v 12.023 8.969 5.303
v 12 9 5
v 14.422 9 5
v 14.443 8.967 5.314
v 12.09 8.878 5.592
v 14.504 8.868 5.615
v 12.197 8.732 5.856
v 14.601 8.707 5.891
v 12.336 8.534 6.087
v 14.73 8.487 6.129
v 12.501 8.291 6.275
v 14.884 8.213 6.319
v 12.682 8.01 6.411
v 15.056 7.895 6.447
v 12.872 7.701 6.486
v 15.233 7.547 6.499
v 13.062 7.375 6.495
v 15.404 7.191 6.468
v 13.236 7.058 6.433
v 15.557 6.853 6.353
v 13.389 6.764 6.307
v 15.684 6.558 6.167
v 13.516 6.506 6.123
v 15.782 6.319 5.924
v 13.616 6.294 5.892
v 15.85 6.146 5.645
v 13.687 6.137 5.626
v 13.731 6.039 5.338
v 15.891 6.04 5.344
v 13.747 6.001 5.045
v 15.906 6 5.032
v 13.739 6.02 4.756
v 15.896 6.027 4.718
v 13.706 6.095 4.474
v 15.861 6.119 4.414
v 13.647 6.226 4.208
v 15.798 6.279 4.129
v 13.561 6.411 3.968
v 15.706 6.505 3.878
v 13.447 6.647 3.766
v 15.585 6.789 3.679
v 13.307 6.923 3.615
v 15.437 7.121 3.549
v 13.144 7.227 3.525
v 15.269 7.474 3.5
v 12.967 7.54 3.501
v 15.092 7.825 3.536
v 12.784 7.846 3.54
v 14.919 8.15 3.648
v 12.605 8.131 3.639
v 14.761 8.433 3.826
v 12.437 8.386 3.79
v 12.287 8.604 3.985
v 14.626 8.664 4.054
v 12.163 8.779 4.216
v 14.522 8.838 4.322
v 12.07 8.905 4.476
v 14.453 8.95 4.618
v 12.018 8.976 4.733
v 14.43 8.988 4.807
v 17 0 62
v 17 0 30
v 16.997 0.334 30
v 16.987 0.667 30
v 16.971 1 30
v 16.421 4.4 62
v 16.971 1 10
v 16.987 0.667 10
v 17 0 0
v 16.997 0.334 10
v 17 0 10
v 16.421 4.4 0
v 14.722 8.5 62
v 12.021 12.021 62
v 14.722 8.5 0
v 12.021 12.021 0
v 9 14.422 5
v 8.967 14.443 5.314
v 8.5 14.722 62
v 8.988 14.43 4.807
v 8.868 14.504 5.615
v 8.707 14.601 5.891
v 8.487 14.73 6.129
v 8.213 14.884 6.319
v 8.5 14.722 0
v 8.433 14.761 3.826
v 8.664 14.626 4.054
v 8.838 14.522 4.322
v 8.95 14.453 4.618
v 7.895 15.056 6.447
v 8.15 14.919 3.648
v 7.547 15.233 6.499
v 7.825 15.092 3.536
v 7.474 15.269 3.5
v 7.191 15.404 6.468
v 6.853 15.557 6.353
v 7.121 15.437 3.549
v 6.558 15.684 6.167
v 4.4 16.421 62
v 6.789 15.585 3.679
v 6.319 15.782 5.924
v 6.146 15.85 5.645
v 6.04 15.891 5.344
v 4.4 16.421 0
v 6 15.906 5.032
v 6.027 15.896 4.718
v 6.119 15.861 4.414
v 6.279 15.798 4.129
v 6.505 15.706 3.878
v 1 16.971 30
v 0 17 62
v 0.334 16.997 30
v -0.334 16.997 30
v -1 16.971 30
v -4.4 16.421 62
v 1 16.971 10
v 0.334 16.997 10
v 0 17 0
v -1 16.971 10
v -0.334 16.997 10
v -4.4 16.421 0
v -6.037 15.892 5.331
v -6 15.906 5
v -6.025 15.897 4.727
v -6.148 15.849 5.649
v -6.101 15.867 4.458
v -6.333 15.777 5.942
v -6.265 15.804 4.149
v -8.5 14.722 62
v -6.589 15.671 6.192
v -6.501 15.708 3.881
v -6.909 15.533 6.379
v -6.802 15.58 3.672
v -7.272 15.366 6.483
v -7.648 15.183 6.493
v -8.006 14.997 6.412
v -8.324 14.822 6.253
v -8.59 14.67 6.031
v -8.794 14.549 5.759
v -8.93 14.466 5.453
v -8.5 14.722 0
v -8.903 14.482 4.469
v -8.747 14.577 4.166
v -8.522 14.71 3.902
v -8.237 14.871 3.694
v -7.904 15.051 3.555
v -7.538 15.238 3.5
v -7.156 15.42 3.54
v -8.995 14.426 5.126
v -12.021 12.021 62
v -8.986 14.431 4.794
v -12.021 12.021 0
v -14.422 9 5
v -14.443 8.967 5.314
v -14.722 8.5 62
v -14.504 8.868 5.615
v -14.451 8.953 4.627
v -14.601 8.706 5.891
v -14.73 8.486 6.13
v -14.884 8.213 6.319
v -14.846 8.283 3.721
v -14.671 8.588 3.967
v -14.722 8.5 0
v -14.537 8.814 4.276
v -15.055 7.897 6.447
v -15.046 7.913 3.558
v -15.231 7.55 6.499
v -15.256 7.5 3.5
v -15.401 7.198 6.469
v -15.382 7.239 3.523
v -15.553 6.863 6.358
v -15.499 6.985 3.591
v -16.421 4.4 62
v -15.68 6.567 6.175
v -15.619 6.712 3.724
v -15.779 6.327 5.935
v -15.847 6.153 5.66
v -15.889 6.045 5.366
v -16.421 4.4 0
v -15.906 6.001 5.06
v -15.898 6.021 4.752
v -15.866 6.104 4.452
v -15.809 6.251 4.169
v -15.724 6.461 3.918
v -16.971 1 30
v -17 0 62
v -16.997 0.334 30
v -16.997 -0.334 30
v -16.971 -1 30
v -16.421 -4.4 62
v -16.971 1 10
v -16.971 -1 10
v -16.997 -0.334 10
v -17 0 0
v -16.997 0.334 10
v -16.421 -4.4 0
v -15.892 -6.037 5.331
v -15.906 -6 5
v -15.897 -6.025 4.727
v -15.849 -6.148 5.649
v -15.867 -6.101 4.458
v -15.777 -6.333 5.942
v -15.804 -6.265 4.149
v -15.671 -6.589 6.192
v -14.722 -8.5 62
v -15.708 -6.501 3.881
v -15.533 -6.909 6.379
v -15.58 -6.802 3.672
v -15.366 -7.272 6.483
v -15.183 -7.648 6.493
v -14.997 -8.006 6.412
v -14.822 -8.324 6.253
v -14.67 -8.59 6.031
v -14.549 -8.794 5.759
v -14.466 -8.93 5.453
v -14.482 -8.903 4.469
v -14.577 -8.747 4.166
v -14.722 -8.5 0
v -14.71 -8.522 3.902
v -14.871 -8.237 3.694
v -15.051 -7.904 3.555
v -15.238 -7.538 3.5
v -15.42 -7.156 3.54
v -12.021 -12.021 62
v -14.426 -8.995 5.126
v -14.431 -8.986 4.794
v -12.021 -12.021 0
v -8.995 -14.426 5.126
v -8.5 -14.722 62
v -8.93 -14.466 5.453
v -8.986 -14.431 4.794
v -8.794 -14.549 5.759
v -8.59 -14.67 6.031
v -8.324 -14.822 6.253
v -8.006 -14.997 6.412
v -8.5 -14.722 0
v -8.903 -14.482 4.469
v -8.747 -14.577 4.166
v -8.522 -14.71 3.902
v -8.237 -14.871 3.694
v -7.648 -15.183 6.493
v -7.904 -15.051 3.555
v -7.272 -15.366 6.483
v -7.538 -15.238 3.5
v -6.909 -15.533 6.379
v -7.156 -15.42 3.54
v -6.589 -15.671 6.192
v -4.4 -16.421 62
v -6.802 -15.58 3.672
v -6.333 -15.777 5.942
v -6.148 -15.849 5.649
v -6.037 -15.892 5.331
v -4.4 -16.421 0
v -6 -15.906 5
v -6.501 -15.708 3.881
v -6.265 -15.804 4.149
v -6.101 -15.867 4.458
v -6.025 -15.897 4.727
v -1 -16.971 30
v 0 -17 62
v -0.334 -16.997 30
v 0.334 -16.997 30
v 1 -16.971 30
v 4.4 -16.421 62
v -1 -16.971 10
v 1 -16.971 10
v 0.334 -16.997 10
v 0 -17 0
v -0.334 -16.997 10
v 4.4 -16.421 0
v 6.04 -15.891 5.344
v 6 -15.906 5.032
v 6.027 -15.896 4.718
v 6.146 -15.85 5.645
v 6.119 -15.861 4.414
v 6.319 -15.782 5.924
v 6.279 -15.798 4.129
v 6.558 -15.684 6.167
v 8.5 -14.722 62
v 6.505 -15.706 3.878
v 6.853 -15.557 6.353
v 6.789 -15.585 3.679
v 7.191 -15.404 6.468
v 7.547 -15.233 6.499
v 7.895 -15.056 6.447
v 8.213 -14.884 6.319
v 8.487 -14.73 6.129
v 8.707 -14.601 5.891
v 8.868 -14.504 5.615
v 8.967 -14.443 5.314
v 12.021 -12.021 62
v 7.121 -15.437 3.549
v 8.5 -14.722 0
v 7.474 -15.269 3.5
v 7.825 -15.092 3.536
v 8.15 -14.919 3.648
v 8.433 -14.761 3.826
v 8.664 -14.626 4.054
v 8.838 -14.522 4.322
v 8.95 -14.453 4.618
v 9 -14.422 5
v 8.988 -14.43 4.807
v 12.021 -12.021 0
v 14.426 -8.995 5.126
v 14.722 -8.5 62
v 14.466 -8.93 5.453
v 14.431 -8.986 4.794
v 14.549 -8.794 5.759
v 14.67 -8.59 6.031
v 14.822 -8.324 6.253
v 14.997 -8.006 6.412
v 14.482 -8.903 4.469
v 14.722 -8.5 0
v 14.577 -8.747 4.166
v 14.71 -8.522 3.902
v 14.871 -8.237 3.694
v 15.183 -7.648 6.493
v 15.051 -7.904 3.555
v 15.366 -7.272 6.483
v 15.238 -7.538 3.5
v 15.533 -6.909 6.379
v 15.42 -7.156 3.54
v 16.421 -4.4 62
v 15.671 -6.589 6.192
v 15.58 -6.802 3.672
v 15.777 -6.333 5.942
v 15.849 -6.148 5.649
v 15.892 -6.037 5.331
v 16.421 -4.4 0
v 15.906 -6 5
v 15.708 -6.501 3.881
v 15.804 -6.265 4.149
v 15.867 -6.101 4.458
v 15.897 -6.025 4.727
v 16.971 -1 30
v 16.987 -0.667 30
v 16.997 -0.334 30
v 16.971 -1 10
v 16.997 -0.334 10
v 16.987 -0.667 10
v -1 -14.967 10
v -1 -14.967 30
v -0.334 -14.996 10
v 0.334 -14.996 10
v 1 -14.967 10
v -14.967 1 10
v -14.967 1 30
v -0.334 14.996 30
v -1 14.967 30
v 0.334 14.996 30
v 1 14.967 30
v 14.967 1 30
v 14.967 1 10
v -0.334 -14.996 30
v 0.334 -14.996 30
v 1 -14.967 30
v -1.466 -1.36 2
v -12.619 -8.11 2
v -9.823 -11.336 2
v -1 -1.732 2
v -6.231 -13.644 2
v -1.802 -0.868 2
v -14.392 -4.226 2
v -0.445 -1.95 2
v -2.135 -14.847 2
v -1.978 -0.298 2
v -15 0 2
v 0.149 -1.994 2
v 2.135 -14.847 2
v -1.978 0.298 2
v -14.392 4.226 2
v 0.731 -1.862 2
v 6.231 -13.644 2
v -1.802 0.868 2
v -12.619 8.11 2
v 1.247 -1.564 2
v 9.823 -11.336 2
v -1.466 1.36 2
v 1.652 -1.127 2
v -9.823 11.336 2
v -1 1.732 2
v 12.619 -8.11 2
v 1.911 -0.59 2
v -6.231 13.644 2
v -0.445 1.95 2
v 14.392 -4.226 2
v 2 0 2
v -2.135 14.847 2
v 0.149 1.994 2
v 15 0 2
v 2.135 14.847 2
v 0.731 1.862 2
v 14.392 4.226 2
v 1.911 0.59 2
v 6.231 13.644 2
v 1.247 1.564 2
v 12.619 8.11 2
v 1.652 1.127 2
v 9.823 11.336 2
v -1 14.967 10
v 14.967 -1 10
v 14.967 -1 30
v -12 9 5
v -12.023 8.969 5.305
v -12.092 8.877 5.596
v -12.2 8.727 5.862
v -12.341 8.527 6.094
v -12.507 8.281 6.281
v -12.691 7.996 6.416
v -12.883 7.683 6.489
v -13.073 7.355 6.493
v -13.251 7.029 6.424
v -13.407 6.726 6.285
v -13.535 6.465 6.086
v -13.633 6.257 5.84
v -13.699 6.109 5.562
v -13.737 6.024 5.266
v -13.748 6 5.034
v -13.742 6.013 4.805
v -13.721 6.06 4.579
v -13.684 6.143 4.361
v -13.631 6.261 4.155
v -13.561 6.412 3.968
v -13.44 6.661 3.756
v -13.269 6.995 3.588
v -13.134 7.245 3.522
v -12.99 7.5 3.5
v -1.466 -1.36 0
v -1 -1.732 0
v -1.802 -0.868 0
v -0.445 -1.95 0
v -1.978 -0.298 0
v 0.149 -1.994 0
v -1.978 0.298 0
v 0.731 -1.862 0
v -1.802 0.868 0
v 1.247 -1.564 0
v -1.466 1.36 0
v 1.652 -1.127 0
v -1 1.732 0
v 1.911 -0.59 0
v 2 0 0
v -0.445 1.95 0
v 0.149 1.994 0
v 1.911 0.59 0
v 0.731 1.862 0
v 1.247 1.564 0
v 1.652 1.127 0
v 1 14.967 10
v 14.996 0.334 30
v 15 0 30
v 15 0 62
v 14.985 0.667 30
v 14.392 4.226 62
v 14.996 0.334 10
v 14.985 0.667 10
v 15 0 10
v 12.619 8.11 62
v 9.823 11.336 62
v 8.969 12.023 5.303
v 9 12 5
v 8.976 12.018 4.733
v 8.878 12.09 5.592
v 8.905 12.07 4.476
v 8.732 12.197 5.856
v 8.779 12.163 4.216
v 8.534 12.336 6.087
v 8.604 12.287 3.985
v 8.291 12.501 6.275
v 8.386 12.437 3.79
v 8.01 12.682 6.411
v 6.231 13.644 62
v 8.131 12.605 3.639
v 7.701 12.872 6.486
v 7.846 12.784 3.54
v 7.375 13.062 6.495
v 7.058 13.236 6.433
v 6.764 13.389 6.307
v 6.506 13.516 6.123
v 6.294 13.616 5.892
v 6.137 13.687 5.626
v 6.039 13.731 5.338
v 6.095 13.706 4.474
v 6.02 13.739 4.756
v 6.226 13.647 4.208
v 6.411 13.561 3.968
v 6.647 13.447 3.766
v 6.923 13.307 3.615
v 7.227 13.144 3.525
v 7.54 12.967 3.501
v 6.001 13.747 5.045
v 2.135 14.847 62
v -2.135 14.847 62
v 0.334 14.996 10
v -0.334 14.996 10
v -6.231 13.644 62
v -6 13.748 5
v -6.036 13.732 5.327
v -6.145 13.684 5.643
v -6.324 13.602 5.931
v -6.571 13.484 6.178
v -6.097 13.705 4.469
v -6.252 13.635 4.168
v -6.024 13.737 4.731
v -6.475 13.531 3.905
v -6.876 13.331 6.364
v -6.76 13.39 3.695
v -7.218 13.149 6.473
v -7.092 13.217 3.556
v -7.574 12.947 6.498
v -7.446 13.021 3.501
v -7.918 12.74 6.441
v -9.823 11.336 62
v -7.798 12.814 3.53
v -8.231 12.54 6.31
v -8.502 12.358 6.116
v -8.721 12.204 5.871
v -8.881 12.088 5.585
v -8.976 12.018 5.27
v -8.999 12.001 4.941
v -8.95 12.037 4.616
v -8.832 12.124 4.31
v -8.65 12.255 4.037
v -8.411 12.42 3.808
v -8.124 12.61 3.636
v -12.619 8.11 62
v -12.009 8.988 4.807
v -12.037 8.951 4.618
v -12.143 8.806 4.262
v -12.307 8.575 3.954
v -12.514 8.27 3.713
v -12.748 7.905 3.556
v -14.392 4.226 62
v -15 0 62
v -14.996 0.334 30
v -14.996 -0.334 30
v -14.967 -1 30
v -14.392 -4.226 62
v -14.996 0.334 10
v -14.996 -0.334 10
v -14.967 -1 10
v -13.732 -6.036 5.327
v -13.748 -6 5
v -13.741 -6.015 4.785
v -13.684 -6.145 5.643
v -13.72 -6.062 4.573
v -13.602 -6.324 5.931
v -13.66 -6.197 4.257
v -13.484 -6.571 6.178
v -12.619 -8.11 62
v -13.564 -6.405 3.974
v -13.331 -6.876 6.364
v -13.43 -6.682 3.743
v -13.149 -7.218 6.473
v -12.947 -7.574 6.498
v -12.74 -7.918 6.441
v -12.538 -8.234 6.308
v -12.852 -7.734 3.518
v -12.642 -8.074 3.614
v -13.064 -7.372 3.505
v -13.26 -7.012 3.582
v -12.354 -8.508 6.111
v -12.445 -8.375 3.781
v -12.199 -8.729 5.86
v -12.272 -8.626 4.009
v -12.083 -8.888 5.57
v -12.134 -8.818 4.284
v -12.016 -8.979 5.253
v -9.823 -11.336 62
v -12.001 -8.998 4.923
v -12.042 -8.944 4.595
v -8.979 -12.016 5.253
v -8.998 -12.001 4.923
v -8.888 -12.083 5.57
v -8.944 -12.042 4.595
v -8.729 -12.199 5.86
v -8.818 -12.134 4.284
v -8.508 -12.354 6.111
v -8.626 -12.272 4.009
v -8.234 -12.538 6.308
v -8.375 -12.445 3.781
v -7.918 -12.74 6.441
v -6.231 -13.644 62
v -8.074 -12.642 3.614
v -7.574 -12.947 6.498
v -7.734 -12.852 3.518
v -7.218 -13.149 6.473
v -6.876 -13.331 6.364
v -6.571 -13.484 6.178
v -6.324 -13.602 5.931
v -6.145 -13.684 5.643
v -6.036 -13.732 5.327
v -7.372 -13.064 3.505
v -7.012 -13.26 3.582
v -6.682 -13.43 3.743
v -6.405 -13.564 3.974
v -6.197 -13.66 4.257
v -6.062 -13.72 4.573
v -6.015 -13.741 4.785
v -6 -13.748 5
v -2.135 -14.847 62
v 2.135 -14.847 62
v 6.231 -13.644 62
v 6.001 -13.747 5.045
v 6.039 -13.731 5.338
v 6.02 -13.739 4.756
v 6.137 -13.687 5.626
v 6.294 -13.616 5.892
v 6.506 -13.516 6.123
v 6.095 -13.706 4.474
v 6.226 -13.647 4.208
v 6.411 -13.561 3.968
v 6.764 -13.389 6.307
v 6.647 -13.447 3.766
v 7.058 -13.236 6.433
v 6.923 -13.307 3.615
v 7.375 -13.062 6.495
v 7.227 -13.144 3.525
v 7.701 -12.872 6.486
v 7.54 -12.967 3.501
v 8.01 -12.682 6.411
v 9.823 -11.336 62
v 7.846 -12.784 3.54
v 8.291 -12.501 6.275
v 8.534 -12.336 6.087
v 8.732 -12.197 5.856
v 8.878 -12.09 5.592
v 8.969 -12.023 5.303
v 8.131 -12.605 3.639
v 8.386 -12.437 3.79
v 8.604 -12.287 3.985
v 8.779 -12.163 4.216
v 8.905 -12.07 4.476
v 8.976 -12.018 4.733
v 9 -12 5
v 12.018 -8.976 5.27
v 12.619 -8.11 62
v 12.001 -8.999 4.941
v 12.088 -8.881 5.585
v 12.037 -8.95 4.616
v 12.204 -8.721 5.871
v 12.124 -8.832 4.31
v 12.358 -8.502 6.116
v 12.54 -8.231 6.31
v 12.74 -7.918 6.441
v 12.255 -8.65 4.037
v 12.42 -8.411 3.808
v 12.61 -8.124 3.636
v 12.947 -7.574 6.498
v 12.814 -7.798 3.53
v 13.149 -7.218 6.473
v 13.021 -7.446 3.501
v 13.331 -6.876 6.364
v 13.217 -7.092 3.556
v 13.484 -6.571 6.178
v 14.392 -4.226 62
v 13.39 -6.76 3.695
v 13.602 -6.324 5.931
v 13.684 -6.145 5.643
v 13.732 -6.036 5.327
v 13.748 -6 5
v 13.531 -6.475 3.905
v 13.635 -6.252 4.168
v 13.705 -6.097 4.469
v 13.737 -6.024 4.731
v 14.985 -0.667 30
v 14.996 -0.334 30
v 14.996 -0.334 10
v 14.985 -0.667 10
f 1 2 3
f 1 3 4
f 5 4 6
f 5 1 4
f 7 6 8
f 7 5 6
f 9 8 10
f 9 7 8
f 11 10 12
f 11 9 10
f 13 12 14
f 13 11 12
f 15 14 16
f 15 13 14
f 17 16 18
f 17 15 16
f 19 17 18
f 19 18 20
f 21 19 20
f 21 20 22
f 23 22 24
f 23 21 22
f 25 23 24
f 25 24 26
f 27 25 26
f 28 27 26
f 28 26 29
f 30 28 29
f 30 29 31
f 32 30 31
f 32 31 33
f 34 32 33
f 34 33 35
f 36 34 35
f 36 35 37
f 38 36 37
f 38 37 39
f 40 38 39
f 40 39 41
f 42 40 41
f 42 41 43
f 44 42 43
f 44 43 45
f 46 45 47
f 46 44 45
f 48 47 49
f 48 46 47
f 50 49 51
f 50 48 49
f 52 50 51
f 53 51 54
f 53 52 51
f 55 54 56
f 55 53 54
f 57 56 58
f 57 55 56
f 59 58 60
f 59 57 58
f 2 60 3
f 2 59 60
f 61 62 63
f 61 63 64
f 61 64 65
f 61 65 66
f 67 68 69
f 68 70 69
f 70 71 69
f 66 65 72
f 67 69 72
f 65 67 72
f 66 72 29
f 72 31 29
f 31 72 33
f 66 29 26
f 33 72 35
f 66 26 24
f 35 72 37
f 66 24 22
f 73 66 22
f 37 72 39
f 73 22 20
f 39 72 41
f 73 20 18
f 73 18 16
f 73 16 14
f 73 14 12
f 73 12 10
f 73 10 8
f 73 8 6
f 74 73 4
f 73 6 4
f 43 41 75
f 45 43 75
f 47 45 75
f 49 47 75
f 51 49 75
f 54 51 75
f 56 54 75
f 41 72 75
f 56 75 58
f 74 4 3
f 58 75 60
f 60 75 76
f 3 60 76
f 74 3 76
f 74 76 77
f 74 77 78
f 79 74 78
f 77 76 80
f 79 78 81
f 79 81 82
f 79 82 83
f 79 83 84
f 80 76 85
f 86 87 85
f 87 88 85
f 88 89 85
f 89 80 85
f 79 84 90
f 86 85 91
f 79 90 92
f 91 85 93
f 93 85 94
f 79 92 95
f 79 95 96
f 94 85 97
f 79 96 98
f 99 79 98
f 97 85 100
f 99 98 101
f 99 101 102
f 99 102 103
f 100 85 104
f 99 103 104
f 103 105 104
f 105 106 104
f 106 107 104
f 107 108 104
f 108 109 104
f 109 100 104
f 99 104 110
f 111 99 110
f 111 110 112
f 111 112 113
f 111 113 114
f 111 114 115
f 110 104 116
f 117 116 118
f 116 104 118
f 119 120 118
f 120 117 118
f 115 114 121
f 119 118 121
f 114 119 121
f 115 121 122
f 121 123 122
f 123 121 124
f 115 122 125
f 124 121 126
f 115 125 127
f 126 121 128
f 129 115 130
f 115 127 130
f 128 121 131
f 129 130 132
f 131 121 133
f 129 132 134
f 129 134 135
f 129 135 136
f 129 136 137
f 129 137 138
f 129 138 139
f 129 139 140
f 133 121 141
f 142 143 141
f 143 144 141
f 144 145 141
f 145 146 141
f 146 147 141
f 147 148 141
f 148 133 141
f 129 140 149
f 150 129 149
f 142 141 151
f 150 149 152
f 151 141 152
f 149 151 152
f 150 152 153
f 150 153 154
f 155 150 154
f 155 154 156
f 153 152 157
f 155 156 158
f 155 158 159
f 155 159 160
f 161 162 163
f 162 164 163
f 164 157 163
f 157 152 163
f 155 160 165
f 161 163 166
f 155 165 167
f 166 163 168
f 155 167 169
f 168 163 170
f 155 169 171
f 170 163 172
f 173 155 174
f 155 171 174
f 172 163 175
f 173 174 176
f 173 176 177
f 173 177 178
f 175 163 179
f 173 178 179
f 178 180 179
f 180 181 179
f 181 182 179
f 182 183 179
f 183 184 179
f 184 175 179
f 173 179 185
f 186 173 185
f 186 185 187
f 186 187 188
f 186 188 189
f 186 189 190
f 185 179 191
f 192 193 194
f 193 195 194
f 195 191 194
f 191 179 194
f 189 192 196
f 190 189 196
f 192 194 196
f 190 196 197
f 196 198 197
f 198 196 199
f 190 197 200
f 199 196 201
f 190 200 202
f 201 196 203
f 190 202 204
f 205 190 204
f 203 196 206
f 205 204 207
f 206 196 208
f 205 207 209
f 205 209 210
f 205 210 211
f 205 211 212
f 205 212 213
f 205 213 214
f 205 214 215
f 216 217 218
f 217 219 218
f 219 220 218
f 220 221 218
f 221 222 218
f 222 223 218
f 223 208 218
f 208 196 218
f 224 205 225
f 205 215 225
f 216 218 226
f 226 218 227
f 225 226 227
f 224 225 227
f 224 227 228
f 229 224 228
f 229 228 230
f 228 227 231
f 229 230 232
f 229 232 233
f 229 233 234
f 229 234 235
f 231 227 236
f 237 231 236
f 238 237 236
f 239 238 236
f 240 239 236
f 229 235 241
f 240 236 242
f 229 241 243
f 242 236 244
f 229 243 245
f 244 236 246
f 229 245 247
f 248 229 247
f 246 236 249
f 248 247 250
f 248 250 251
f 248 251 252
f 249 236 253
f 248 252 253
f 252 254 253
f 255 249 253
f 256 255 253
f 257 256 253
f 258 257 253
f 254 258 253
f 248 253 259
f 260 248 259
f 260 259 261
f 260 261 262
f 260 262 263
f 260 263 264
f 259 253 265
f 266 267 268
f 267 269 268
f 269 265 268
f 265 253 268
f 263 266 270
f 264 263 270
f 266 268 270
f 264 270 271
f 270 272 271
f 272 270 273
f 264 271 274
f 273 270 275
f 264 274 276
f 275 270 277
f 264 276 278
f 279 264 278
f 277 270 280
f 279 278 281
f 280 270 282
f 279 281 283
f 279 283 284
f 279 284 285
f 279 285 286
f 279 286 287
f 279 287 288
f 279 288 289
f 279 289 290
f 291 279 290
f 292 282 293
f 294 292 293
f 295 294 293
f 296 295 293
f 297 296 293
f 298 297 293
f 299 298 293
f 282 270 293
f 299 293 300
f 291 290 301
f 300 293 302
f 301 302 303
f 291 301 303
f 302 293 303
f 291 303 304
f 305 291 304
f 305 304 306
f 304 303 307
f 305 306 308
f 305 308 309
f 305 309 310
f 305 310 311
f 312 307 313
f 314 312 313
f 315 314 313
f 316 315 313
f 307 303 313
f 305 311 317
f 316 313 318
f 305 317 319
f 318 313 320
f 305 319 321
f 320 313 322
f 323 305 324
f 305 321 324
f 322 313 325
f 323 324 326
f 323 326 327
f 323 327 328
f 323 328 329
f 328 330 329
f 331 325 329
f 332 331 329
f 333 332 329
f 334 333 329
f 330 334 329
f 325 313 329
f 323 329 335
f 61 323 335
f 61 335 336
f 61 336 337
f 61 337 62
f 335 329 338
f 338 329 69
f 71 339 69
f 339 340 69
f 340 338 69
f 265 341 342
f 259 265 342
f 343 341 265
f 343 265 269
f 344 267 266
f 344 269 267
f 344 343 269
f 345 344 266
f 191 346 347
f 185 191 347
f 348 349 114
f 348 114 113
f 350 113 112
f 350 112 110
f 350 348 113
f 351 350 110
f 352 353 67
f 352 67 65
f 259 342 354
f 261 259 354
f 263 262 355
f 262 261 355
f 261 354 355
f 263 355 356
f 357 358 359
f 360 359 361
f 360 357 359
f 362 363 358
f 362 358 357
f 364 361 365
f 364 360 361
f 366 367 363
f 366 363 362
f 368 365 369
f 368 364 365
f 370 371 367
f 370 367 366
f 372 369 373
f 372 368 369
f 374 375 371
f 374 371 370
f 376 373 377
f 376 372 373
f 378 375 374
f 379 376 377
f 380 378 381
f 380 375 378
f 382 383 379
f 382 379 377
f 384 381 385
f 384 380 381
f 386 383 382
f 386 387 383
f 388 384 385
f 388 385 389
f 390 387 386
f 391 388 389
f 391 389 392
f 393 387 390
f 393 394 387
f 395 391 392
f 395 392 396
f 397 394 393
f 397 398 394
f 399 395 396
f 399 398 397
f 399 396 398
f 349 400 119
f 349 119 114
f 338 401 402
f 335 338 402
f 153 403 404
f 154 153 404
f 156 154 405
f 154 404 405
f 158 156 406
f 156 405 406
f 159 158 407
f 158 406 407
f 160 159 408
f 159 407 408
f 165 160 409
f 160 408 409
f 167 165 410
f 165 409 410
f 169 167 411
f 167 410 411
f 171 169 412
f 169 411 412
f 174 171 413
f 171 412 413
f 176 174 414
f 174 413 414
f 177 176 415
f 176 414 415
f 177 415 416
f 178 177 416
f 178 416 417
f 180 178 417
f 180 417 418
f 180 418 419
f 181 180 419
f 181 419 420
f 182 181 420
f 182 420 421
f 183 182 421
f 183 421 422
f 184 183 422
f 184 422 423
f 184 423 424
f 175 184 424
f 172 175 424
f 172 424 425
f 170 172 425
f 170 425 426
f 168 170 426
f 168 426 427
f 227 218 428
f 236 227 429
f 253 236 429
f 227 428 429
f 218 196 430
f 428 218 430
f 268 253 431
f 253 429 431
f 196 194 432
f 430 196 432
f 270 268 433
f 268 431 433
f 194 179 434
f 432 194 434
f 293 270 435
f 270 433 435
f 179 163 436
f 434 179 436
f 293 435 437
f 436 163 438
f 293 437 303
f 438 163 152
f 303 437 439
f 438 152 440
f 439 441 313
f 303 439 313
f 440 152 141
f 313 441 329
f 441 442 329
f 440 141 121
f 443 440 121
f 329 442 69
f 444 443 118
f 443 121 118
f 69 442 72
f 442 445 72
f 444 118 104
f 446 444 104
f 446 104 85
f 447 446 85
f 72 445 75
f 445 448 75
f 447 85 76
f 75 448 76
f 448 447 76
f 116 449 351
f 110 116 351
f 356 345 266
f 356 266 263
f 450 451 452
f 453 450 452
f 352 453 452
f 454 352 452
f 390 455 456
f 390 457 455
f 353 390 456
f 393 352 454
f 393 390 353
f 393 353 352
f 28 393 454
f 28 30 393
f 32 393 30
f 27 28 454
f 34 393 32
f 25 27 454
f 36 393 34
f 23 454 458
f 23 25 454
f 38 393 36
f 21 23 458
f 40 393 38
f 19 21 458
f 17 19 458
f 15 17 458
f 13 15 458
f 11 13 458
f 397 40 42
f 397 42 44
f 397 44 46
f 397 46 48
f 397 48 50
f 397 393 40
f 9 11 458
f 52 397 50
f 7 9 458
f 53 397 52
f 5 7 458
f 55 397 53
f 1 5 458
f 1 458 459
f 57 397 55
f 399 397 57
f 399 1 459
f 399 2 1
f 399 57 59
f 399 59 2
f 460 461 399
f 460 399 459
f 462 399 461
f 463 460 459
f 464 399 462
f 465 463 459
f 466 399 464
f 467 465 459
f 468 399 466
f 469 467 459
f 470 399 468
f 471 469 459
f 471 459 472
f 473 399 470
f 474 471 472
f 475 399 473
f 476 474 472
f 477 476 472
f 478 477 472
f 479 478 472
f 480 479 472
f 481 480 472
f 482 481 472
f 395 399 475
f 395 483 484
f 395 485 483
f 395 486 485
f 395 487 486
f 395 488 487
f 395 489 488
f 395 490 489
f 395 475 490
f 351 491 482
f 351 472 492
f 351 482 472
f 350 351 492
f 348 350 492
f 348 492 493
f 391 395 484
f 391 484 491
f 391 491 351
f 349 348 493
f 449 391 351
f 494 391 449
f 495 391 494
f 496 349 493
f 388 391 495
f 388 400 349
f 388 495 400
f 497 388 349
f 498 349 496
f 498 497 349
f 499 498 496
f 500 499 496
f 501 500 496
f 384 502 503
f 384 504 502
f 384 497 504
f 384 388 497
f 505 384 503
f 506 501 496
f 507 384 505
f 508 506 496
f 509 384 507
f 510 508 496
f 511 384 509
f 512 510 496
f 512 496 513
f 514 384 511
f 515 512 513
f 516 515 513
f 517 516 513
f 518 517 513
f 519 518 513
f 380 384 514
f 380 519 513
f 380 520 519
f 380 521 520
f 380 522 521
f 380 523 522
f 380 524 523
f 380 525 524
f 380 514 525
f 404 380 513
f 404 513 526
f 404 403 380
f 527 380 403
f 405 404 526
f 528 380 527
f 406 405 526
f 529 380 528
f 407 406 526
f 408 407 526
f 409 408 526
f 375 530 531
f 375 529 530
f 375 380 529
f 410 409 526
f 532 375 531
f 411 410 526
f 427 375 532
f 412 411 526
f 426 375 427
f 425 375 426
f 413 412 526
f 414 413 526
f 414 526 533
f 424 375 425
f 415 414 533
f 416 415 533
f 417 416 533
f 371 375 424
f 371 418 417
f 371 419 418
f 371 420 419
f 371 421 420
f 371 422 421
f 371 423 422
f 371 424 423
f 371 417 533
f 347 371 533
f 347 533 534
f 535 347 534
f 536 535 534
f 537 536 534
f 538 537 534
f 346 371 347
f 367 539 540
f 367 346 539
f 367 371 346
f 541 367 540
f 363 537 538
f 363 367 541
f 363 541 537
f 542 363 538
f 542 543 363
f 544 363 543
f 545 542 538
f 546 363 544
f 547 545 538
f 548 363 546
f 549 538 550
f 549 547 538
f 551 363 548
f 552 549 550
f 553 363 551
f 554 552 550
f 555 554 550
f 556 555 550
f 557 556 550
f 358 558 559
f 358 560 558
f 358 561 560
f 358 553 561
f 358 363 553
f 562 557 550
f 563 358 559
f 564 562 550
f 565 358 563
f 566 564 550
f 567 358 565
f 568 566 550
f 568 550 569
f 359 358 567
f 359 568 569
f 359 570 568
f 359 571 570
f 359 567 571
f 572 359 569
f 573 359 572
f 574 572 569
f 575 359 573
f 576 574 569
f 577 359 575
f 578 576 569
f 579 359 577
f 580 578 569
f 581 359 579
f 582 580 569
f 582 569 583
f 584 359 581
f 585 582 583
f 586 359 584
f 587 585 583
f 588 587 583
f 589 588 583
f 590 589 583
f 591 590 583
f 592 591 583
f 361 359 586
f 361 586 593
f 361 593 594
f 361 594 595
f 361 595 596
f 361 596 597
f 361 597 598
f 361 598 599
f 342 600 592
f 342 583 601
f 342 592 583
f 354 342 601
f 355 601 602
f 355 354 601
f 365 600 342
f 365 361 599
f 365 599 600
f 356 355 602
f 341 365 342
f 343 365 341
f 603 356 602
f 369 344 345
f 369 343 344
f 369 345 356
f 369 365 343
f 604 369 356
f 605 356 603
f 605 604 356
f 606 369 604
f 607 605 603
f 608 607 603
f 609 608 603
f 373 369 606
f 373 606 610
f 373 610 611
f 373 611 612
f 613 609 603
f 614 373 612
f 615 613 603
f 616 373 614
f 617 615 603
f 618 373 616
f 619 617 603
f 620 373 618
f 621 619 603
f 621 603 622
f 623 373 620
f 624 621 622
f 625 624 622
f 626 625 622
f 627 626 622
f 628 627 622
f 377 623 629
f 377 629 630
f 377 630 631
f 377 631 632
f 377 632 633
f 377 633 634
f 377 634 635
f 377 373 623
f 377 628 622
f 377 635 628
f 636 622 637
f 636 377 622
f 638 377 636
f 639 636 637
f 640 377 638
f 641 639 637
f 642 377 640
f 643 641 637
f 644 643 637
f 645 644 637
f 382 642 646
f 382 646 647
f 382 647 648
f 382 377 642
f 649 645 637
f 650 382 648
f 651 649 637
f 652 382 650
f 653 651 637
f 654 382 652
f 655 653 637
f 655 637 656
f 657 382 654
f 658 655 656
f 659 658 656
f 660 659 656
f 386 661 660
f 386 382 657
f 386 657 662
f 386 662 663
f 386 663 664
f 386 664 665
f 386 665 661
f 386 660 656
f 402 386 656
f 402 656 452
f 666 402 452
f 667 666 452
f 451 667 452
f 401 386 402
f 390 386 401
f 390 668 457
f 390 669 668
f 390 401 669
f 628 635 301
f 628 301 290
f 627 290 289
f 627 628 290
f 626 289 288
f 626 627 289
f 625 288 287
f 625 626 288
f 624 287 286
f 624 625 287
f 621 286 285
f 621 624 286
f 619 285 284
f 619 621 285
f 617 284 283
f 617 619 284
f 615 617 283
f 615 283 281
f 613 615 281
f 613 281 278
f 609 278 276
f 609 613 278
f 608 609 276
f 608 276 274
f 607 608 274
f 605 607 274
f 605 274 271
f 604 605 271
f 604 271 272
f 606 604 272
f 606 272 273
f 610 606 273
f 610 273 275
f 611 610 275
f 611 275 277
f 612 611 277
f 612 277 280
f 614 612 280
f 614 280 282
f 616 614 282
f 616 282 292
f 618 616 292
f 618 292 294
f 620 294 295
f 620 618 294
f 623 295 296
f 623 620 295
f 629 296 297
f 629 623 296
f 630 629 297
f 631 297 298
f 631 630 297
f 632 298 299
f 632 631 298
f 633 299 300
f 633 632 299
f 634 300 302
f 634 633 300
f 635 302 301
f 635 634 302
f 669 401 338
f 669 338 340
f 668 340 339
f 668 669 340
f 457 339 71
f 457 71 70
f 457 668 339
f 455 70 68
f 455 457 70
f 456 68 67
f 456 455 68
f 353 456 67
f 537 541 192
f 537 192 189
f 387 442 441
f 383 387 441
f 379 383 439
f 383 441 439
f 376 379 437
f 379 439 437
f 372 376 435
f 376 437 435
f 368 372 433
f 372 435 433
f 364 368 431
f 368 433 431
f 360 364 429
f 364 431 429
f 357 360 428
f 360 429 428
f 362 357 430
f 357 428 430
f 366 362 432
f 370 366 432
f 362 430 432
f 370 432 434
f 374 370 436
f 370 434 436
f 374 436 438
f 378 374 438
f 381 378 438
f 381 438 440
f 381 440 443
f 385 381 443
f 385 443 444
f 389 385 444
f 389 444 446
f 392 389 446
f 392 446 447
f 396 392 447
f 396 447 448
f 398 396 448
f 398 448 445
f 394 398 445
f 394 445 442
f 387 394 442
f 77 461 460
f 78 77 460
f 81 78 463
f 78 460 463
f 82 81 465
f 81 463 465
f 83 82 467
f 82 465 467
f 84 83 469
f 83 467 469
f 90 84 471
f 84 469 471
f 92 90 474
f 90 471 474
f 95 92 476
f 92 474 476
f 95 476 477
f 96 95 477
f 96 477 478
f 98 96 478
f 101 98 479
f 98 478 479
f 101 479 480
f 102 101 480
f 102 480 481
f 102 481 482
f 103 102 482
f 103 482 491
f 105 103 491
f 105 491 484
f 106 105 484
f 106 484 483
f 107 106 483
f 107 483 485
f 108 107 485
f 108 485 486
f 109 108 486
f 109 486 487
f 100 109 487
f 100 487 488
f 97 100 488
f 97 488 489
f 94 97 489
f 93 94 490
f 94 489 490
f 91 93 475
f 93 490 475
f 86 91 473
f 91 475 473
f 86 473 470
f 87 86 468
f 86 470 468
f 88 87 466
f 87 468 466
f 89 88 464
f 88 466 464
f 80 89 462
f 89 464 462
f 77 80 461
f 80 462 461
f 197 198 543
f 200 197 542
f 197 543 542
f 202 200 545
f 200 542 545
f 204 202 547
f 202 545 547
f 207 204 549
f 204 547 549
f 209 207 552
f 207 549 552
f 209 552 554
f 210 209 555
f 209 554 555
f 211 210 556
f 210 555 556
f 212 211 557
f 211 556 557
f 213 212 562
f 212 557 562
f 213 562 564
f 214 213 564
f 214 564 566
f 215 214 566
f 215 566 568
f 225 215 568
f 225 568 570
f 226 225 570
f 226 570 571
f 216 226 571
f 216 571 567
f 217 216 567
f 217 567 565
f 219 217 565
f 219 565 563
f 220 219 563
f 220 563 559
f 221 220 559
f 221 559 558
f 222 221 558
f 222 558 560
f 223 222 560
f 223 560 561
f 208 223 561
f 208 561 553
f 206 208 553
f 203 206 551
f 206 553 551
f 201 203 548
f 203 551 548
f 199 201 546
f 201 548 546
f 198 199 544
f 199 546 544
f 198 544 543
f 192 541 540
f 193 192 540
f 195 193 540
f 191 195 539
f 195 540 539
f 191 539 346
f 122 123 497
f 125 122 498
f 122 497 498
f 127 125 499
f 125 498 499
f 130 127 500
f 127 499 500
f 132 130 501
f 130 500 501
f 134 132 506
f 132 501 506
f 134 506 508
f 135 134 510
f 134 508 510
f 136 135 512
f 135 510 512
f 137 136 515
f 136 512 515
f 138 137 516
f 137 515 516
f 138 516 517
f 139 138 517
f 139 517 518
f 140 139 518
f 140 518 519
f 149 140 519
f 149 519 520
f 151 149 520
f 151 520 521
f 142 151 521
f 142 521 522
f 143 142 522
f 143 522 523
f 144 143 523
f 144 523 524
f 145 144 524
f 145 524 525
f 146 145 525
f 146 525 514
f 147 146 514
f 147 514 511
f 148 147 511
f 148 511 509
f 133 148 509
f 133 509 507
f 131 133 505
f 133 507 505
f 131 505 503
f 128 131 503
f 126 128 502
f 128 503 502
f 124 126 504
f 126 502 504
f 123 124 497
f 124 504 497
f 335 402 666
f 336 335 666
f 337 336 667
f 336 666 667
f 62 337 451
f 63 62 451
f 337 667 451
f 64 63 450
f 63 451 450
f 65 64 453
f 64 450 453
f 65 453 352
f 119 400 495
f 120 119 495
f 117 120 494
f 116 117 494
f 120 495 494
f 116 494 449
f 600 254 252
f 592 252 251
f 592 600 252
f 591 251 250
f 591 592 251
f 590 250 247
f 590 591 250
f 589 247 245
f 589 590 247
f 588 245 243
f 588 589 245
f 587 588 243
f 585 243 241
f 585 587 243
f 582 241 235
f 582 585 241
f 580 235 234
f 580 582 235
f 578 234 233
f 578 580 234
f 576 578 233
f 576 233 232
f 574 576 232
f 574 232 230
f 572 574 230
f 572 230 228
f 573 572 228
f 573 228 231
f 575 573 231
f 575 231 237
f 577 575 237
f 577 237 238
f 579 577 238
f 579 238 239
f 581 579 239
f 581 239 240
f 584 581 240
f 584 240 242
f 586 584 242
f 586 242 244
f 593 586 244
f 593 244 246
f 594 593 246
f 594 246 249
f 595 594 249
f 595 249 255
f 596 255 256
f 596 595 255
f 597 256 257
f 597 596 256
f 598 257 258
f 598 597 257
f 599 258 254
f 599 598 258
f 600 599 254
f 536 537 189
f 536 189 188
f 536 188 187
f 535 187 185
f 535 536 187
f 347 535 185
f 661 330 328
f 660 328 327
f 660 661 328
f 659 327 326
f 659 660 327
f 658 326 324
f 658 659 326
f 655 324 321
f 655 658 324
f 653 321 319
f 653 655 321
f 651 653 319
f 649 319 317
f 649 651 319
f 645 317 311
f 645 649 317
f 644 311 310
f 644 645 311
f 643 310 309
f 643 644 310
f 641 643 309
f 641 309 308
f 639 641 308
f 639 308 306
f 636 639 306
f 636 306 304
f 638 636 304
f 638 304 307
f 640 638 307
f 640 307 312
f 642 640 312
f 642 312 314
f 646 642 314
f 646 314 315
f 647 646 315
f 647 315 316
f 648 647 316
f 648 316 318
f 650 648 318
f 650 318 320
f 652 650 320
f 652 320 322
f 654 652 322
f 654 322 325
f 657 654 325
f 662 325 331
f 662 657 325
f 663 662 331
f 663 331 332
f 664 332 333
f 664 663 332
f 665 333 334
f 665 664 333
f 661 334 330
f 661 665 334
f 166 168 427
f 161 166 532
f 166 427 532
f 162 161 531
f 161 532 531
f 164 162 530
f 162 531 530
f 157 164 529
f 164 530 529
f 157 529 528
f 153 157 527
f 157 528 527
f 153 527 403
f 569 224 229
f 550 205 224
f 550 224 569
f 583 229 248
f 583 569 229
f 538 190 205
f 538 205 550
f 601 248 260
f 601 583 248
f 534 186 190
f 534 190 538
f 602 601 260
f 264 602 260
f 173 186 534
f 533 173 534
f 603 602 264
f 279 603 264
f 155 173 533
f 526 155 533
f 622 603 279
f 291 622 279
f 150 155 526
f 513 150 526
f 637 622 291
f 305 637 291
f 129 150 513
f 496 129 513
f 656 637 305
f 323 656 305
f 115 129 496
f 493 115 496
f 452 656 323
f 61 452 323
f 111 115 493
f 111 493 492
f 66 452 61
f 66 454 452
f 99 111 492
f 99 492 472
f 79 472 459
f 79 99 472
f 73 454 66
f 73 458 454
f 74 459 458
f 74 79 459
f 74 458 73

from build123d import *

# Parameters (mm, degrees)
F0_R      = 17
F1_DEPTH  = 62
F2_T      = -2
F3_W      = 2
F3_H      = 20
F4_DEPTH  = 25
F5_W      = 2
F5_H      = 20
F6_DEPTH  = 25
F7_W      = 2
F7_H      = 20
F8_DEPTH  = 25
F9_W      = 2
F9_H      = 20
F10_DEPTH = 25
F11_R     = 1.5
F12_DEPTH = 25
F13_R     = 1.5
F14_DEPTH = 25
F15_R     = 1.5
F16_DEPTH = 25
F17_R     = 1.5
F18_DEPTH = 25
F19_R     = 2
F20_DEPTH = 25


with BuildPart() as f1:
    # F0 (on Top) → F1 (new body)
    with BuildSketch(Plane.XY):
        Circle(F0_R)
    extrude(amount=F1_DEPTH)

    # F2
    f2_openings = [f1.faces().sort_by_distance(p)[0] for p in [
        (0, 0, 62),
    ]]
    offset(amount=F2_T, openings=f2_openings)

    # F3 (on Front) → F4 (cut)
    with BuildSketch(Plane.XZ):
        with Locations((0, 20)):
            Rectangle(F3_W, F3_H)
    extrude(amount=-F4_DEPTH, mode=Mode.SUBTRACT)

    # F5 (on Front) → F6 (cut)
    with BuildSketch(Plane.XZ):
        with Locations((0, 20)):
            Rectangle(F5_W, F5_H)
    extrude(amount=F6_DEPTH, mode=Mode.SUBTRACT)

    # F7 (on Right) → F8 (cut)
    with BuildSketch(Plane.YZ):
        with Locations((0, 20)):
            Rectangle(F7_W, F7_H)
    extrude(amount=-F8_DEPTH, mode=Mode.SUBTRACT)

    # F9 (on Right) → F10 (cut)
    with BuildSketch(Plane.YZ):
        with Locations((0, 20)):
            Rectangle(F9_W, F9_H)
    extrude(amount=F10_DEPTH, mode=Mode.SUBTRACT)

    # F11 (on Front) → F12 (cut)
    with BuildSketch(Plane.XZ):
        with Locations((7.5, 5)):
            Circle(F11_R)
        with Locations((-7.5, 5)):
            Circle(F11_R)
    extrude(amount=-F12_DEPTH, mode=Mode.SUBTRACT)

    # F13 (on Front) → F14 (cut)
    with BuildSketch(Plane.XZ):
        with Locations((7.5, 5)):
            Circle(F13_R)
        with Locations((-7.5, 5)):
            Circle(F13_R)
    extrude(amount=F14_DEPTH, mode=Mode.SUBTRACT)

    # F15 (on Right) → F16 (cut)
    with BuildSketch(Plane.YZ):
        with BuildLine():
            ThreePointArc((7.5, 3.5), (8.56066, 3.93934), (9, 5))
            ThreePointArc((9, 5), (6.43934, 6.06066), (7.5, 3.5))
        make_face()
        with Locations((-7.5, 5)):
            Circle(F15_R)
    extrude(amount=-F16_DEPTH, mode=Mode.SUBTRACT)

    # F17 (on Right) → F18 (cut)
    with BuildSketch(Plane.YZ):
        with Locations((-7.5, 5)):
            Circle(F17_R)
        with Locations((7.5, 5)):
            Circle(F17_R)
    extrude(amount=F18_DEPTH, mode=Mode.SUBTRACT)

    # F19 (on face) → F20 (cut)
    with BuildSketch(Plane(origin=(0, 0, 0), x_dir=(1, 0, 0), z_dir=(0, 0, -1))):
        Circle(F19_R)
    extrude(amount=-F20_DEPTH, mode=Mode.SUBTRACT)


solid = f1.part
